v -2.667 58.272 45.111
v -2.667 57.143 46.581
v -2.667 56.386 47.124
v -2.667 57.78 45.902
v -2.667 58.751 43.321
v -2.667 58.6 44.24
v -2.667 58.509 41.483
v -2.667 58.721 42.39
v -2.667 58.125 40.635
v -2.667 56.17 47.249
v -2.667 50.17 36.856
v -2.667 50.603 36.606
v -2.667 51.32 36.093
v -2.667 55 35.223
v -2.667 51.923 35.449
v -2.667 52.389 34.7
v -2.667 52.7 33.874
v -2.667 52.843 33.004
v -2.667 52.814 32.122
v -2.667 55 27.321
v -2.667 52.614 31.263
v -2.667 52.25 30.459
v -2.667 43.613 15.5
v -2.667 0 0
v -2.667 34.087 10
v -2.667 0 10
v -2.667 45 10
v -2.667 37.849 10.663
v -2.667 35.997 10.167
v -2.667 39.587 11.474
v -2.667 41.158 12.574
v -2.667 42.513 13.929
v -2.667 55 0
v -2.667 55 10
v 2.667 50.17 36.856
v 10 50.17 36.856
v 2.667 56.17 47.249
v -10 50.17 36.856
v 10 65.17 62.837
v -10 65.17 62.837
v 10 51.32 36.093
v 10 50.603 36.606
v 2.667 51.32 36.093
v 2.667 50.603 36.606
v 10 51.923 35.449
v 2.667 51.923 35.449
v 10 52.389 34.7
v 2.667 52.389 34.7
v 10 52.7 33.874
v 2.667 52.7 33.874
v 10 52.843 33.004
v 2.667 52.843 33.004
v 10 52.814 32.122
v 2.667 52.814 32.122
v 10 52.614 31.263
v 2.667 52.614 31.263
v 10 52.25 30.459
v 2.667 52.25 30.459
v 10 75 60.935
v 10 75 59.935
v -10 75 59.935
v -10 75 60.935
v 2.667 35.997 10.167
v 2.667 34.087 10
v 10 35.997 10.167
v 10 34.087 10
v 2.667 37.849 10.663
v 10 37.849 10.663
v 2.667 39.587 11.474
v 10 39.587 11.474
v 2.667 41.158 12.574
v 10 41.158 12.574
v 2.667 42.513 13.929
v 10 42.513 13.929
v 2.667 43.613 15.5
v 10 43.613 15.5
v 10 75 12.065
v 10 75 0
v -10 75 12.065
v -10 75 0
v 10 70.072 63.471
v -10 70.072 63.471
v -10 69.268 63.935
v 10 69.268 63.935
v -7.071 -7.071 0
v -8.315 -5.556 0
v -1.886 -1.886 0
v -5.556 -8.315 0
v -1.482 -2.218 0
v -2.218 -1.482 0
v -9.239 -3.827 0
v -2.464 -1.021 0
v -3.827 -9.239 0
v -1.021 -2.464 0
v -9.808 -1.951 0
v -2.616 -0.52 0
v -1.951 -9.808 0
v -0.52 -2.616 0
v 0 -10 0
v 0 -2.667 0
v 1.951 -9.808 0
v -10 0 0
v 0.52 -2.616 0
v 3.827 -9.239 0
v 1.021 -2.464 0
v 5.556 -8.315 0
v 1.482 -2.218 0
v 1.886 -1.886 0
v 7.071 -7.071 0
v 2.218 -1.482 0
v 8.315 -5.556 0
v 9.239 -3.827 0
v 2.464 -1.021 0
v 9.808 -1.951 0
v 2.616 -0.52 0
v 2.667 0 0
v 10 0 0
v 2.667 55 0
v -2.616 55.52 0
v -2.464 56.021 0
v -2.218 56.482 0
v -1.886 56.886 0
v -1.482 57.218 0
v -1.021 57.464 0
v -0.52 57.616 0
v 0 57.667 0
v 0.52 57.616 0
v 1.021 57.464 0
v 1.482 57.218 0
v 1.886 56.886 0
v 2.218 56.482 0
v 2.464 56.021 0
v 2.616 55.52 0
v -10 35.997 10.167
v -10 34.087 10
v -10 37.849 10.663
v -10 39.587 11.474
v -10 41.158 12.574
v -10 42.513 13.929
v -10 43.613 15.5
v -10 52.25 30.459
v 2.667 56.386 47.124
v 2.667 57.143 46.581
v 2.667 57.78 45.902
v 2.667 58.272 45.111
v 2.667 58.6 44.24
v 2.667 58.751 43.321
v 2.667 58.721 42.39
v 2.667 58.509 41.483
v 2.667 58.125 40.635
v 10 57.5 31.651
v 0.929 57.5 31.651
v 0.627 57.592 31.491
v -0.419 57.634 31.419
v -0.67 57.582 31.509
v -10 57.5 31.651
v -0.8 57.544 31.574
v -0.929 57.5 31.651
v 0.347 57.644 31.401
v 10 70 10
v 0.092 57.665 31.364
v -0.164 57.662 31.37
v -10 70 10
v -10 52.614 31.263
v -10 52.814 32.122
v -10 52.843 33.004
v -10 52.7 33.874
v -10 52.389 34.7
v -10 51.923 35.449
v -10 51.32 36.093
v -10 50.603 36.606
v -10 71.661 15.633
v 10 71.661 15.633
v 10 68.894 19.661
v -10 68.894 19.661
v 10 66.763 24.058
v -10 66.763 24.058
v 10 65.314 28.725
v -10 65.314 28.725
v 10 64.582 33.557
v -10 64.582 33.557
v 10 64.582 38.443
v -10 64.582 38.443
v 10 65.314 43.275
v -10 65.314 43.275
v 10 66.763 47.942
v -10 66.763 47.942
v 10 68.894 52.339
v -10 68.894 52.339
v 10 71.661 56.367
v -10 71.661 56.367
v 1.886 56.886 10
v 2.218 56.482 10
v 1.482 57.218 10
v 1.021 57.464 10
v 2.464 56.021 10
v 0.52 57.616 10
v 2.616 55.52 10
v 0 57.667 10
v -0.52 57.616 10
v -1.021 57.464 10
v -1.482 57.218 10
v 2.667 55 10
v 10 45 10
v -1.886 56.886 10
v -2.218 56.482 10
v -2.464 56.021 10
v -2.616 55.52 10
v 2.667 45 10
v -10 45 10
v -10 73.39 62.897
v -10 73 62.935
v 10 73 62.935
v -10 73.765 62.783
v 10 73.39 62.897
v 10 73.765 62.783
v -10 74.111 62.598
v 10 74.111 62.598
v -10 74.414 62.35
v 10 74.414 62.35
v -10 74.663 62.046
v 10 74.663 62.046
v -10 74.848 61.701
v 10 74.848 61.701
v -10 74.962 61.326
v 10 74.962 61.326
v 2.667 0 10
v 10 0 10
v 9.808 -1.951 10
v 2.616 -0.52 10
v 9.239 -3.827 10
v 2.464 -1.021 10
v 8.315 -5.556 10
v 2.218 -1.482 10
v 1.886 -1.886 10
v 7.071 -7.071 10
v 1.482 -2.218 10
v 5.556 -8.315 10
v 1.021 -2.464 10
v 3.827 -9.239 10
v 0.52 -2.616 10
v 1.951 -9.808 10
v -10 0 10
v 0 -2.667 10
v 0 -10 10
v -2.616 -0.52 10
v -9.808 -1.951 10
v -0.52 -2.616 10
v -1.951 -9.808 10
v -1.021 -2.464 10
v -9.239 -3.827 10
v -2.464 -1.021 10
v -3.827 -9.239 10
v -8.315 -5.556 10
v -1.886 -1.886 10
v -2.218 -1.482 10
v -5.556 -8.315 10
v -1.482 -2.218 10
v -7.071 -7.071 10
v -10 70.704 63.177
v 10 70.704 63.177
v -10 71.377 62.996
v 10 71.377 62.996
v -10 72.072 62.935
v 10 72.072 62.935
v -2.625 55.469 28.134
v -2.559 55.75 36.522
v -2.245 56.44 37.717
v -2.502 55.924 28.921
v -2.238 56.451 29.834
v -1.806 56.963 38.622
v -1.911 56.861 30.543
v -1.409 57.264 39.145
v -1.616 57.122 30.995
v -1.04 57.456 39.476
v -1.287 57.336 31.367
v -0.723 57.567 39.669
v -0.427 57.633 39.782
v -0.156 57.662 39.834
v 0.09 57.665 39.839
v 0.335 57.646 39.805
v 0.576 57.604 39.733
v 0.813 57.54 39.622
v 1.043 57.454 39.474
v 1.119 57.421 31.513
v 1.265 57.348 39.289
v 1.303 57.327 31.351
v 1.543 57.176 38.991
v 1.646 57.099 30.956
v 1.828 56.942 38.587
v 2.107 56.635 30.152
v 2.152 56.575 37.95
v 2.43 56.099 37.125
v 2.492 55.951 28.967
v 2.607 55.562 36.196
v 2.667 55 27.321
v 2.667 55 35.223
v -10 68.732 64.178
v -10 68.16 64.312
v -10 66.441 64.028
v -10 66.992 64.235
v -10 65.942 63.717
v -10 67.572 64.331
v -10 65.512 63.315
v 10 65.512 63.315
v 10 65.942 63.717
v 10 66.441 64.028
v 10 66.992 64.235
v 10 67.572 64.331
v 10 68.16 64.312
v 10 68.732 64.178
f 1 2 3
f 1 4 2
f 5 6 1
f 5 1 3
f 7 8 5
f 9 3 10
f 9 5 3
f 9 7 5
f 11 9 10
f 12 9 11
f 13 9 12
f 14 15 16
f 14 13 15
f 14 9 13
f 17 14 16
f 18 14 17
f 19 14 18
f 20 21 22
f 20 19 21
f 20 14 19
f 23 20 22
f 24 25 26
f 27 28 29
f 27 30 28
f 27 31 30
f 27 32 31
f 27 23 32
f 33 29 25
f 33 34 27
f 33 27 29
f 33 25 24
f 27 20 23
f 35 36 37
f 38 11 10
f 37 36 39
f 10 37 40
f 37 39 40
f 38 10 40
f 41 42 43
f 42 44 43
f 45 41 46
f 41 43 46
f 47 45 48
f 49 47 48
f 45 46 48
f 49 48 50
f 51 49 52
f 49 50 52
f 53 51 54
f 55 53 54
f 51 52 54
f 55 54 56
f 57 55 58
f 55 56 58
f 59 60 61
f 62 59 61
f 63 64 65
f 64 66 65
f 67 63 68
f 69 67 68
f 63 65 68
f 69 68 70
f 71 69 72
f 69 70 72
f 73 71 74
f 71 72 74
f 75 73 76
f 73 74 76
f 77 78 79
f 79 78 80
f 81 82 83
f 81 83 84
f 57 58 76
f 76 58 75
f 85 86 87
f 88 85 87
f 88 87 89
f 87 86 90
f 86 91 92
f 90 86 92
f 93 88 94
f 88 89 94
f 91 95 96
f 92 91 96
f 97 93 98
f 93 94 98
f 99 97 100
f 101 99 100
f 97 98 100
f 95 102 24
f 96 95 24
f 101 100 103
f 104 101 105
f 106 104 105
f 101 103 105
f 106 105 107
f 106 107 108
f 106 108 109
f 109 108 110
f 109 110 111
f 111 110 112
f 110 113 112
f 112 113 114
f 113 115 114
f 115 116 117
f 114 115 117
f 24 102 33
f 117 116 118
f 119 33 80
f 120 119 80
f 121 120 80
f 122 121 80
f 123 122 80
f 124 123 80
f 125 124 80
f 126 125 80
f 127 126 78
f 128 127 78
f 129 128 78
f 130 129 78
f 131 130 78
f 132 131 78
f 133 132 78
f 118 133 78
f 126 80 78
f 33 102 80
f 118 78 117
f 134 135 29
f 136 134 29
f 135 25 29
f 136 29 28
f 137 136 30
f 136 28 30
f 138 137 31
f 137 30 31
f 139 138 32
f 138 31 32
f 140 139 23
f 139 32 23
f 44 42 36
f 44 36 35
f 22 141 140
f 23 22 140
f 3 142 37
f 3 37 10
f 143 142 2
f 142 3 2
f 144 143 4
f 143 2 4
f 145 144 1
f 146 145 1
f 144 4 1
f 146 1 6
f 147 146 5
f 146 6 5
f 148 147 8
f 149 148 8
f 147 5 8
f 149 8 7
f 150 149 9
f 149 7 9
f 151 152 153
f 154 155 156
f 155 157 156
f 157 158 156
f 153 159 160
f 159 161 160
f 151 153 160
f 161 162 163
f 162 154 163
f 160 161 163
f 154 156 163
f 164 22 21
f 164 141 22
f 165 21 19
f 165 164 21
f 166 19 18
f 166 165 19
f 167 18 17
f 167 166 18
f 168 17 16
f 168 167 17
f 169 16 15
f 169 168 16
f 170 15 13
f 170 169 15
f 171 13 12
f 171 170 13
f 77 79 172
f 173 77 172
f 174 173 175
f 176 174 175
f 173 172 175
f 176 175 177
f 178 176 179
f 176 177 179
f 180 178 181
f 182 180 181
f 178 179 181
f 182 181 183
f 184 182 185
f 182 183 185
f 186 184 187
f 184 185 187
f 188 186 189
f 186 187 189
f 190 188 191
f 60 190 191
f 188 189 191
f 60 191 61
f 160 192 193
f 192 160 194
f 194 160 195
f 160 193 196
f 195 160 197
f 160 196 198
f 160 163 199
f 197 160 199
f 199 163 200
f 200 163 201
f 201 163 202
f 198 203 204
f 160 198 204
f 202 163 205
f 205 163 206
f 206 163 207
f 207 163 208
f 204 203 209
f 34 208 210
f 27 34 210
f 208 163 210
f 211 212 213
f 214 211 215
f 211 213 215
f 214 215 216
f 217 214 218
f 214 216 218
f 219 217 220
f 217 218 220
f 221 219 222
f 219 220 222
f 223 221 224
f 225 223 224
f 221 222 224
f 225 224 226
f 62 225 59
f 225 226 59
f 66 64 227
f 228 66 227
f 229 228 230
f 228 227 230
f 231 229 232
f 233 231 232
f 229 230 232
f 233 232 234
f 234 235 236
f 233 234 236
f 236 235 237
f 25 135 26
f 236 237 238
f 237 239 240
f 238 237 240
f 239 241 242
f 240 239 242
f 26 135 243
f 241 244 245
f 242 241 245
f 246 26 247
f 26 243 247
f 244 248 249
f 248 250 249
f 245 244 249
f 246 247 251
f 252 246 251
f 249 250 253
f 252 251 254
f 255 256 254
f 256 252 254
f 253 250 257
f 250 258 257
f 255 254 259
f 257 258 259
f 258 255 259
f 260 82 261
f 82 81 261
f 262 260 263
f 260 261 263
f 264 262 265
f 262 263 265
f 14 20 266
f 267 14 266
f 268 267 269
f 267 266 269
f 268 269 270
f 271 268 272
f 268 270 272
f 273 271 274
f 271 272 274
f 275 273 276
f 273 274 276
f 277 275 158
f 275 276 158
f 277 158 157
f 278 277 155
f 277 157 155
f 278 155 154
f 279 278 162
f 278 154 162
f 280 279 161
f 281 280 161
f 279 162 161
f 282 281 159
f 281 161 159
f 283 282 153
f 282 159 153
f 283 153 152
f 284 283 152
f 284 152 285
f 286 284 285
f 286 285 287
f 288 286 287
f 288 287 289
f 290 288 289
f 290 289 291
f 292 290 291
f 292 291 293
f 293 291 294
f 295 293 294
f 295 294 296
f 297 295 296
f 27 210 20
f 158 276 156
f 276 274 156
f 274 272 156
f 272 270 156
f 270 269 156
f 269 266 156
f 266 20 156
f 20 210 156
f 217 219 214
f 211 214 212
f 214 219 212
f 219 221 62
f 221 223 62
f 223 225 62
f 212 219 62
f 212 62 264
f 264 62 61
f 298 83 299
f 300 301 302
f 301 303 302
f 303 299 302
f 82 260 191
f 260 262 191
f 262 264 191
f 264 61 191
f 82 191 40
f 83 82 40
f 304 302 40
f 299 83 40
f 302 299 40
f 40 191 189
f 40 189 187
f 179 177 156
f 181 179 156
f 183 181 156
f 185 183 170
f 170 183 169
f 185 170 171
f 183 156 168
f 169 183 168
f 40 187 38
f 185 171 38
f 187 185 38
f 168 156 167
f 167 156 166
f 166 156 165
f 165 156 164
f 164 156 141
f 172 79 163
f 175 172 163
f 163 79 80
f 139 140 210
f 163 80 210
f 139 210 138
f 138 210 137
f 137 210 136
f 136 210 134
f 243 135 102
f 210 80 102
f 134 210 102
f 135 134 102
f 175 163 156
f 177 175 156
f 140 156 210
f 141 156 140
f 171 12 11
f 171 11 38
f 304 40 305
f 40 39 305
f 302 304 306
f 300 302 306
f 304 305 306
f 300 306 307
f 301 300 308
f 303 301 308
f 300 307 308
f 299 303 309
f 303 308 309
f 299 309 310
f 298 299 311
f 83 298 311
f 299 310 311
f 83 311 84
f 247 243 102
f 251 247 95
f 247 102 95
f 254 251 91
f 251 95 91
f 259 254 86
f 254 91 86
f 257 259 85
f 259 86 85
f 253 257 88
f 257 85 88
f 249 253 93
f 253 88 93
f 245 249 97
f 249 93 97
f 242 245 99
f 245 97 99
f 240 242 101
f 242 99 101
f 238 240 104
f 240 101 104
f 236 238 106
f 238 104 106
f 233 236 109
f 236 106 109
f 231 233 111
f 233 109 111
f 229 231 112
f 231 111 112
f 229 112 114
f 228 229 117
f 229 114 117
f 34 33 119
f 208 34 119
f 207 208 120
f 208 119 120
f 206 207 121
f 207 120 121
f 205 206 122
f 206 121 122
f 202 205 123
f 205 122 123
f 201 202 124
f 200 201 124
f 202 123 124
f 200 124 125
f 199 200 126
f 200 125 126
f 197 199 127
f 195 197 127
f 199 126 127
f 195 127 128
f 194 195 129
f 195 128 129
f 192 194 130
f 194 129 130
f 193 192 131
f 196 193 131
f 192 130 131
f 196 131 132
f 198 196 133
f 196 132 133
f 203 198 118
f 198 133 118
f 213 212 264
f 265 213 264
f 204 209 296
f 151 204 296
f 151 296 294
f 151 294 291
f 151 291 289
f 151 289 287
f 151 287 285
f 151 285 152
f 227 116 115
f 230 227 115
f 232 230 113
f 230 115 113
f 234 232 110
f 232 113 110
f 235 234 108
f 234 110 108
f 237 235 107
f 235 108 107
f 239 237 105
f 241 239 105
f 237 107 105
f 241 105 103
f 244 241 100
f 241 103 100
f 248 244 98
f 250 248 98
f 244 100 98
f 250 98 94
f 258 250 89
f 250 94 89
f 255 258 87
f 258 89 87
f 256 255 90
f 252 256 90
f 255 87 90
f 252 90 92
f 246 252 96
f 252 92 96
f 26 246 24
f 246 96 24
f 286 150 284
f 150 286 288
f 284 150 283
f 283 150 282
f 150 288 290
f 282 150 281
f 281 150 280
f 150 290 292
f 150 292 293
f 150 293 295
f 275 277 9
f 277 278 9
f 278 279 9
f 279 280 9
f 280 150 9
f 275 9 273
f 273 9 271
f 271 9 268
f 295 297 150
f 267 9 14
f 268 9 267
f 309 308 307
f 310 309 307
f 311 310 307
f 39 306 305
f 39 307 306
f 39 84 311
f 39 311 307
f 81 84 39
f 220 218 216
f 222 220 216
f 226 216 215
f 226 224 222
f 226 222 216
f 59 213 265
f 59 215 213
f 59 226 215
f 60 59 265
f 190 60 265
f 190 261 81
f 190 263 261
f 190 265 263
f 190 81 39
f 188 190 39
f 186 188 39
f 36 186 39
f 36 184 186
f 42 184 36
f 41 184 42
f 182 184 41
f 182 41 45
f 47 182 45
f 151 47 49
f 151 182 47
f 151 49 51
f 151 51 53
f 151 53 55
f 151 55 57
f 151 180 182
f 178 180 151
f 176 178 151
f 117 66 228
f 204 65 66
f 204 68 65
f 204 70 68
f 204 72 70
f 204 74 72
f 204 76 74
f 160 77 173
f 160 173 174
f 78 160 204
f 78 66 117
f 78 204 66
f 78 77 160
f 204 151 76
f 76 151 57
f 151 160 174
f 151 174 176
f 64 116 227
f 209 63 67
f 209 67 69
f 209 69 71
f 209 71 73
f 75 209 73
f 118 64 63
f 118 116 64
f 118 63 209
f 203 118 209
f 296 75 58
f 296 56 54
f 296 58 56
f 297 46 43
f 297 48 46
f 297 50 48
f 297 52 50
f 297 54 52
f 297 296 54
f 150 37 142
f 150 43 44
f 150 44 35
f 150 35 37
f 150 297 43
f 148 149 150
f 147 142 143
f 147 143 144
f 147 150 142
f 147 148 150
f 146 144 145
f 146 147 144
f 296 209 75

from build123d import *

# Parameters (mm, degrees)
PAD_DEPTH       = 67.31
POCKET_DEPTH    = 20.001
POCKET001_DEPTH = 62.936332
FILLET_R        = 11
PAD001_DEPTH    = 5
FILLET001_R     = 4.5
FILLET002_R     = 4.75
FILLET003_R     = 3
FILLET004_R     = 4
FILLET005_R     = 2


with BuildPart() as part:
    # Sketch → Pad (new body)
    with BuildSketch(Plane.XY):
        with BuildLine():
            Line((-10, 75), (-10, 0))
            ThreePointArc((-10, 0), (0, -10), (10, 0))
            Line((10, 0), (10, 75))
            Line((10, 75), (-10, 75))
        make_face()
    extrude(amount=PAD_DEPTH)

    # Sketch001 (on Face1 of Pad) → Pocket (cut, through all)
    with BuildSketch(Plane(origin=(-10, 0, 0), x_dir=(0, -1, 0), z_dir=(-1, 0, 0))):
        Polygon((-71, 62.935332), (-40.437772, 10), (26.946924, 10), (26.946924, 74.479118), (-81.836647, 74.479118), (-81.836647, 62.935332), align=None)
        with BuildLine():
            ThreePointArc((-75, 12.064668), (-64.49, 36), (-75, 59.935332))
            Line((-75, 59.935332), (-97, 36))
            Line((-97, 36), (-75, 12.064668))
        make_face()
        Polygon((-70, 10), (-45, 10), (-57.5, 31.650635), align=None)
    extrude(amount=-POCKET_DEPTH, mode=Mode.SUBTRACT)

    # Sketch002 (on Face2 of Pocket) → Pocket001 (cut, through all)
    with BuildSketch(Plane(origin=(0, 0, 0), x_dir=(1, 0, 0), z_dir=(0, 0, -1))):
        with BuildLine():
            ThreePointArc((2.667, 0), (0, 2.667), (-2.667, 0))
            Line((-2.667, 0), (-2.667, -55))
            ThreePointArc((-2.667, -55), (0, -57.667), (2.667, -55))
            Line((2.667, 0), (2.667, -55))
        make_face()
    extrude(amount=-POCKET001_DEPTH, mode=Mode.SUBTRACT)

    # Fillet
    fillet_edges = [part.edges().sort_by_distance(p)[0] for p in [
        (6.3335, 40.437772, 10),
        (-6.3335, 40.437772, 10),
    ]]
    fillet(fillet_edges, radius=FILLET_R)

    # Sketch003 (on Face5 of Fillet) → Pad001 (join)
    with BuildSketch(Plane(origin=(0, 25.998202, -15.010069), x_dir=(1, 0, 0), z_dir=(0, -0.866025, 0.5))):
        Polygon((-10, 90.003596), (10, 90.003596), (10, 57.003596), (2.667, 57.003596), (2.667, 69.003596), (-2.667, 69.003596), (-2.667, 57.003596), (-10, 57.003596), align=None)
    extrude(amount=PAD001_DEPTH)

    # Fillet001
    fillet001_edges = [part.edges().sort_by_distance(p)[0] for p in [
        (6.3335, 54.5, 34.356493),
        (-6.3335, 54.5, 34.356493),
    ]]
    fillet(fillet001_edges, radius=FILLET001_R)

    # Fillet002
    fillet002_edges = [part.edges().sort_by_distance(p)[0] for p in [
        (0, 60.5, 44.748798),
    ]]
    fillet(fillet002_edges, radius=FILLET002_R)

    # Fillet003
    fillet003_edges = [part.edges().sort_by_distance(p)[0] for p in [
        (0, 66.669873, 65.435332),
    ]]
    fillet(fillet003_edges, radius=FILLET003_R)

    # Fillet004
    fillet004_edges = [part.edges().sort_by_distance(p)[0] for p in [
        (0, 71, 62.935332),
    ]]
    fillet(fillet004_edges, radius=FILLET004_R)

    # Fillet005
    fillet005_edges = [part.edges().sort_by_distance(p)[0] for p in [
        (0, 75, 62.935332),
    ]]
    fillet(fillet005_edges, radius=FILLET005_R)


solid = part.part
